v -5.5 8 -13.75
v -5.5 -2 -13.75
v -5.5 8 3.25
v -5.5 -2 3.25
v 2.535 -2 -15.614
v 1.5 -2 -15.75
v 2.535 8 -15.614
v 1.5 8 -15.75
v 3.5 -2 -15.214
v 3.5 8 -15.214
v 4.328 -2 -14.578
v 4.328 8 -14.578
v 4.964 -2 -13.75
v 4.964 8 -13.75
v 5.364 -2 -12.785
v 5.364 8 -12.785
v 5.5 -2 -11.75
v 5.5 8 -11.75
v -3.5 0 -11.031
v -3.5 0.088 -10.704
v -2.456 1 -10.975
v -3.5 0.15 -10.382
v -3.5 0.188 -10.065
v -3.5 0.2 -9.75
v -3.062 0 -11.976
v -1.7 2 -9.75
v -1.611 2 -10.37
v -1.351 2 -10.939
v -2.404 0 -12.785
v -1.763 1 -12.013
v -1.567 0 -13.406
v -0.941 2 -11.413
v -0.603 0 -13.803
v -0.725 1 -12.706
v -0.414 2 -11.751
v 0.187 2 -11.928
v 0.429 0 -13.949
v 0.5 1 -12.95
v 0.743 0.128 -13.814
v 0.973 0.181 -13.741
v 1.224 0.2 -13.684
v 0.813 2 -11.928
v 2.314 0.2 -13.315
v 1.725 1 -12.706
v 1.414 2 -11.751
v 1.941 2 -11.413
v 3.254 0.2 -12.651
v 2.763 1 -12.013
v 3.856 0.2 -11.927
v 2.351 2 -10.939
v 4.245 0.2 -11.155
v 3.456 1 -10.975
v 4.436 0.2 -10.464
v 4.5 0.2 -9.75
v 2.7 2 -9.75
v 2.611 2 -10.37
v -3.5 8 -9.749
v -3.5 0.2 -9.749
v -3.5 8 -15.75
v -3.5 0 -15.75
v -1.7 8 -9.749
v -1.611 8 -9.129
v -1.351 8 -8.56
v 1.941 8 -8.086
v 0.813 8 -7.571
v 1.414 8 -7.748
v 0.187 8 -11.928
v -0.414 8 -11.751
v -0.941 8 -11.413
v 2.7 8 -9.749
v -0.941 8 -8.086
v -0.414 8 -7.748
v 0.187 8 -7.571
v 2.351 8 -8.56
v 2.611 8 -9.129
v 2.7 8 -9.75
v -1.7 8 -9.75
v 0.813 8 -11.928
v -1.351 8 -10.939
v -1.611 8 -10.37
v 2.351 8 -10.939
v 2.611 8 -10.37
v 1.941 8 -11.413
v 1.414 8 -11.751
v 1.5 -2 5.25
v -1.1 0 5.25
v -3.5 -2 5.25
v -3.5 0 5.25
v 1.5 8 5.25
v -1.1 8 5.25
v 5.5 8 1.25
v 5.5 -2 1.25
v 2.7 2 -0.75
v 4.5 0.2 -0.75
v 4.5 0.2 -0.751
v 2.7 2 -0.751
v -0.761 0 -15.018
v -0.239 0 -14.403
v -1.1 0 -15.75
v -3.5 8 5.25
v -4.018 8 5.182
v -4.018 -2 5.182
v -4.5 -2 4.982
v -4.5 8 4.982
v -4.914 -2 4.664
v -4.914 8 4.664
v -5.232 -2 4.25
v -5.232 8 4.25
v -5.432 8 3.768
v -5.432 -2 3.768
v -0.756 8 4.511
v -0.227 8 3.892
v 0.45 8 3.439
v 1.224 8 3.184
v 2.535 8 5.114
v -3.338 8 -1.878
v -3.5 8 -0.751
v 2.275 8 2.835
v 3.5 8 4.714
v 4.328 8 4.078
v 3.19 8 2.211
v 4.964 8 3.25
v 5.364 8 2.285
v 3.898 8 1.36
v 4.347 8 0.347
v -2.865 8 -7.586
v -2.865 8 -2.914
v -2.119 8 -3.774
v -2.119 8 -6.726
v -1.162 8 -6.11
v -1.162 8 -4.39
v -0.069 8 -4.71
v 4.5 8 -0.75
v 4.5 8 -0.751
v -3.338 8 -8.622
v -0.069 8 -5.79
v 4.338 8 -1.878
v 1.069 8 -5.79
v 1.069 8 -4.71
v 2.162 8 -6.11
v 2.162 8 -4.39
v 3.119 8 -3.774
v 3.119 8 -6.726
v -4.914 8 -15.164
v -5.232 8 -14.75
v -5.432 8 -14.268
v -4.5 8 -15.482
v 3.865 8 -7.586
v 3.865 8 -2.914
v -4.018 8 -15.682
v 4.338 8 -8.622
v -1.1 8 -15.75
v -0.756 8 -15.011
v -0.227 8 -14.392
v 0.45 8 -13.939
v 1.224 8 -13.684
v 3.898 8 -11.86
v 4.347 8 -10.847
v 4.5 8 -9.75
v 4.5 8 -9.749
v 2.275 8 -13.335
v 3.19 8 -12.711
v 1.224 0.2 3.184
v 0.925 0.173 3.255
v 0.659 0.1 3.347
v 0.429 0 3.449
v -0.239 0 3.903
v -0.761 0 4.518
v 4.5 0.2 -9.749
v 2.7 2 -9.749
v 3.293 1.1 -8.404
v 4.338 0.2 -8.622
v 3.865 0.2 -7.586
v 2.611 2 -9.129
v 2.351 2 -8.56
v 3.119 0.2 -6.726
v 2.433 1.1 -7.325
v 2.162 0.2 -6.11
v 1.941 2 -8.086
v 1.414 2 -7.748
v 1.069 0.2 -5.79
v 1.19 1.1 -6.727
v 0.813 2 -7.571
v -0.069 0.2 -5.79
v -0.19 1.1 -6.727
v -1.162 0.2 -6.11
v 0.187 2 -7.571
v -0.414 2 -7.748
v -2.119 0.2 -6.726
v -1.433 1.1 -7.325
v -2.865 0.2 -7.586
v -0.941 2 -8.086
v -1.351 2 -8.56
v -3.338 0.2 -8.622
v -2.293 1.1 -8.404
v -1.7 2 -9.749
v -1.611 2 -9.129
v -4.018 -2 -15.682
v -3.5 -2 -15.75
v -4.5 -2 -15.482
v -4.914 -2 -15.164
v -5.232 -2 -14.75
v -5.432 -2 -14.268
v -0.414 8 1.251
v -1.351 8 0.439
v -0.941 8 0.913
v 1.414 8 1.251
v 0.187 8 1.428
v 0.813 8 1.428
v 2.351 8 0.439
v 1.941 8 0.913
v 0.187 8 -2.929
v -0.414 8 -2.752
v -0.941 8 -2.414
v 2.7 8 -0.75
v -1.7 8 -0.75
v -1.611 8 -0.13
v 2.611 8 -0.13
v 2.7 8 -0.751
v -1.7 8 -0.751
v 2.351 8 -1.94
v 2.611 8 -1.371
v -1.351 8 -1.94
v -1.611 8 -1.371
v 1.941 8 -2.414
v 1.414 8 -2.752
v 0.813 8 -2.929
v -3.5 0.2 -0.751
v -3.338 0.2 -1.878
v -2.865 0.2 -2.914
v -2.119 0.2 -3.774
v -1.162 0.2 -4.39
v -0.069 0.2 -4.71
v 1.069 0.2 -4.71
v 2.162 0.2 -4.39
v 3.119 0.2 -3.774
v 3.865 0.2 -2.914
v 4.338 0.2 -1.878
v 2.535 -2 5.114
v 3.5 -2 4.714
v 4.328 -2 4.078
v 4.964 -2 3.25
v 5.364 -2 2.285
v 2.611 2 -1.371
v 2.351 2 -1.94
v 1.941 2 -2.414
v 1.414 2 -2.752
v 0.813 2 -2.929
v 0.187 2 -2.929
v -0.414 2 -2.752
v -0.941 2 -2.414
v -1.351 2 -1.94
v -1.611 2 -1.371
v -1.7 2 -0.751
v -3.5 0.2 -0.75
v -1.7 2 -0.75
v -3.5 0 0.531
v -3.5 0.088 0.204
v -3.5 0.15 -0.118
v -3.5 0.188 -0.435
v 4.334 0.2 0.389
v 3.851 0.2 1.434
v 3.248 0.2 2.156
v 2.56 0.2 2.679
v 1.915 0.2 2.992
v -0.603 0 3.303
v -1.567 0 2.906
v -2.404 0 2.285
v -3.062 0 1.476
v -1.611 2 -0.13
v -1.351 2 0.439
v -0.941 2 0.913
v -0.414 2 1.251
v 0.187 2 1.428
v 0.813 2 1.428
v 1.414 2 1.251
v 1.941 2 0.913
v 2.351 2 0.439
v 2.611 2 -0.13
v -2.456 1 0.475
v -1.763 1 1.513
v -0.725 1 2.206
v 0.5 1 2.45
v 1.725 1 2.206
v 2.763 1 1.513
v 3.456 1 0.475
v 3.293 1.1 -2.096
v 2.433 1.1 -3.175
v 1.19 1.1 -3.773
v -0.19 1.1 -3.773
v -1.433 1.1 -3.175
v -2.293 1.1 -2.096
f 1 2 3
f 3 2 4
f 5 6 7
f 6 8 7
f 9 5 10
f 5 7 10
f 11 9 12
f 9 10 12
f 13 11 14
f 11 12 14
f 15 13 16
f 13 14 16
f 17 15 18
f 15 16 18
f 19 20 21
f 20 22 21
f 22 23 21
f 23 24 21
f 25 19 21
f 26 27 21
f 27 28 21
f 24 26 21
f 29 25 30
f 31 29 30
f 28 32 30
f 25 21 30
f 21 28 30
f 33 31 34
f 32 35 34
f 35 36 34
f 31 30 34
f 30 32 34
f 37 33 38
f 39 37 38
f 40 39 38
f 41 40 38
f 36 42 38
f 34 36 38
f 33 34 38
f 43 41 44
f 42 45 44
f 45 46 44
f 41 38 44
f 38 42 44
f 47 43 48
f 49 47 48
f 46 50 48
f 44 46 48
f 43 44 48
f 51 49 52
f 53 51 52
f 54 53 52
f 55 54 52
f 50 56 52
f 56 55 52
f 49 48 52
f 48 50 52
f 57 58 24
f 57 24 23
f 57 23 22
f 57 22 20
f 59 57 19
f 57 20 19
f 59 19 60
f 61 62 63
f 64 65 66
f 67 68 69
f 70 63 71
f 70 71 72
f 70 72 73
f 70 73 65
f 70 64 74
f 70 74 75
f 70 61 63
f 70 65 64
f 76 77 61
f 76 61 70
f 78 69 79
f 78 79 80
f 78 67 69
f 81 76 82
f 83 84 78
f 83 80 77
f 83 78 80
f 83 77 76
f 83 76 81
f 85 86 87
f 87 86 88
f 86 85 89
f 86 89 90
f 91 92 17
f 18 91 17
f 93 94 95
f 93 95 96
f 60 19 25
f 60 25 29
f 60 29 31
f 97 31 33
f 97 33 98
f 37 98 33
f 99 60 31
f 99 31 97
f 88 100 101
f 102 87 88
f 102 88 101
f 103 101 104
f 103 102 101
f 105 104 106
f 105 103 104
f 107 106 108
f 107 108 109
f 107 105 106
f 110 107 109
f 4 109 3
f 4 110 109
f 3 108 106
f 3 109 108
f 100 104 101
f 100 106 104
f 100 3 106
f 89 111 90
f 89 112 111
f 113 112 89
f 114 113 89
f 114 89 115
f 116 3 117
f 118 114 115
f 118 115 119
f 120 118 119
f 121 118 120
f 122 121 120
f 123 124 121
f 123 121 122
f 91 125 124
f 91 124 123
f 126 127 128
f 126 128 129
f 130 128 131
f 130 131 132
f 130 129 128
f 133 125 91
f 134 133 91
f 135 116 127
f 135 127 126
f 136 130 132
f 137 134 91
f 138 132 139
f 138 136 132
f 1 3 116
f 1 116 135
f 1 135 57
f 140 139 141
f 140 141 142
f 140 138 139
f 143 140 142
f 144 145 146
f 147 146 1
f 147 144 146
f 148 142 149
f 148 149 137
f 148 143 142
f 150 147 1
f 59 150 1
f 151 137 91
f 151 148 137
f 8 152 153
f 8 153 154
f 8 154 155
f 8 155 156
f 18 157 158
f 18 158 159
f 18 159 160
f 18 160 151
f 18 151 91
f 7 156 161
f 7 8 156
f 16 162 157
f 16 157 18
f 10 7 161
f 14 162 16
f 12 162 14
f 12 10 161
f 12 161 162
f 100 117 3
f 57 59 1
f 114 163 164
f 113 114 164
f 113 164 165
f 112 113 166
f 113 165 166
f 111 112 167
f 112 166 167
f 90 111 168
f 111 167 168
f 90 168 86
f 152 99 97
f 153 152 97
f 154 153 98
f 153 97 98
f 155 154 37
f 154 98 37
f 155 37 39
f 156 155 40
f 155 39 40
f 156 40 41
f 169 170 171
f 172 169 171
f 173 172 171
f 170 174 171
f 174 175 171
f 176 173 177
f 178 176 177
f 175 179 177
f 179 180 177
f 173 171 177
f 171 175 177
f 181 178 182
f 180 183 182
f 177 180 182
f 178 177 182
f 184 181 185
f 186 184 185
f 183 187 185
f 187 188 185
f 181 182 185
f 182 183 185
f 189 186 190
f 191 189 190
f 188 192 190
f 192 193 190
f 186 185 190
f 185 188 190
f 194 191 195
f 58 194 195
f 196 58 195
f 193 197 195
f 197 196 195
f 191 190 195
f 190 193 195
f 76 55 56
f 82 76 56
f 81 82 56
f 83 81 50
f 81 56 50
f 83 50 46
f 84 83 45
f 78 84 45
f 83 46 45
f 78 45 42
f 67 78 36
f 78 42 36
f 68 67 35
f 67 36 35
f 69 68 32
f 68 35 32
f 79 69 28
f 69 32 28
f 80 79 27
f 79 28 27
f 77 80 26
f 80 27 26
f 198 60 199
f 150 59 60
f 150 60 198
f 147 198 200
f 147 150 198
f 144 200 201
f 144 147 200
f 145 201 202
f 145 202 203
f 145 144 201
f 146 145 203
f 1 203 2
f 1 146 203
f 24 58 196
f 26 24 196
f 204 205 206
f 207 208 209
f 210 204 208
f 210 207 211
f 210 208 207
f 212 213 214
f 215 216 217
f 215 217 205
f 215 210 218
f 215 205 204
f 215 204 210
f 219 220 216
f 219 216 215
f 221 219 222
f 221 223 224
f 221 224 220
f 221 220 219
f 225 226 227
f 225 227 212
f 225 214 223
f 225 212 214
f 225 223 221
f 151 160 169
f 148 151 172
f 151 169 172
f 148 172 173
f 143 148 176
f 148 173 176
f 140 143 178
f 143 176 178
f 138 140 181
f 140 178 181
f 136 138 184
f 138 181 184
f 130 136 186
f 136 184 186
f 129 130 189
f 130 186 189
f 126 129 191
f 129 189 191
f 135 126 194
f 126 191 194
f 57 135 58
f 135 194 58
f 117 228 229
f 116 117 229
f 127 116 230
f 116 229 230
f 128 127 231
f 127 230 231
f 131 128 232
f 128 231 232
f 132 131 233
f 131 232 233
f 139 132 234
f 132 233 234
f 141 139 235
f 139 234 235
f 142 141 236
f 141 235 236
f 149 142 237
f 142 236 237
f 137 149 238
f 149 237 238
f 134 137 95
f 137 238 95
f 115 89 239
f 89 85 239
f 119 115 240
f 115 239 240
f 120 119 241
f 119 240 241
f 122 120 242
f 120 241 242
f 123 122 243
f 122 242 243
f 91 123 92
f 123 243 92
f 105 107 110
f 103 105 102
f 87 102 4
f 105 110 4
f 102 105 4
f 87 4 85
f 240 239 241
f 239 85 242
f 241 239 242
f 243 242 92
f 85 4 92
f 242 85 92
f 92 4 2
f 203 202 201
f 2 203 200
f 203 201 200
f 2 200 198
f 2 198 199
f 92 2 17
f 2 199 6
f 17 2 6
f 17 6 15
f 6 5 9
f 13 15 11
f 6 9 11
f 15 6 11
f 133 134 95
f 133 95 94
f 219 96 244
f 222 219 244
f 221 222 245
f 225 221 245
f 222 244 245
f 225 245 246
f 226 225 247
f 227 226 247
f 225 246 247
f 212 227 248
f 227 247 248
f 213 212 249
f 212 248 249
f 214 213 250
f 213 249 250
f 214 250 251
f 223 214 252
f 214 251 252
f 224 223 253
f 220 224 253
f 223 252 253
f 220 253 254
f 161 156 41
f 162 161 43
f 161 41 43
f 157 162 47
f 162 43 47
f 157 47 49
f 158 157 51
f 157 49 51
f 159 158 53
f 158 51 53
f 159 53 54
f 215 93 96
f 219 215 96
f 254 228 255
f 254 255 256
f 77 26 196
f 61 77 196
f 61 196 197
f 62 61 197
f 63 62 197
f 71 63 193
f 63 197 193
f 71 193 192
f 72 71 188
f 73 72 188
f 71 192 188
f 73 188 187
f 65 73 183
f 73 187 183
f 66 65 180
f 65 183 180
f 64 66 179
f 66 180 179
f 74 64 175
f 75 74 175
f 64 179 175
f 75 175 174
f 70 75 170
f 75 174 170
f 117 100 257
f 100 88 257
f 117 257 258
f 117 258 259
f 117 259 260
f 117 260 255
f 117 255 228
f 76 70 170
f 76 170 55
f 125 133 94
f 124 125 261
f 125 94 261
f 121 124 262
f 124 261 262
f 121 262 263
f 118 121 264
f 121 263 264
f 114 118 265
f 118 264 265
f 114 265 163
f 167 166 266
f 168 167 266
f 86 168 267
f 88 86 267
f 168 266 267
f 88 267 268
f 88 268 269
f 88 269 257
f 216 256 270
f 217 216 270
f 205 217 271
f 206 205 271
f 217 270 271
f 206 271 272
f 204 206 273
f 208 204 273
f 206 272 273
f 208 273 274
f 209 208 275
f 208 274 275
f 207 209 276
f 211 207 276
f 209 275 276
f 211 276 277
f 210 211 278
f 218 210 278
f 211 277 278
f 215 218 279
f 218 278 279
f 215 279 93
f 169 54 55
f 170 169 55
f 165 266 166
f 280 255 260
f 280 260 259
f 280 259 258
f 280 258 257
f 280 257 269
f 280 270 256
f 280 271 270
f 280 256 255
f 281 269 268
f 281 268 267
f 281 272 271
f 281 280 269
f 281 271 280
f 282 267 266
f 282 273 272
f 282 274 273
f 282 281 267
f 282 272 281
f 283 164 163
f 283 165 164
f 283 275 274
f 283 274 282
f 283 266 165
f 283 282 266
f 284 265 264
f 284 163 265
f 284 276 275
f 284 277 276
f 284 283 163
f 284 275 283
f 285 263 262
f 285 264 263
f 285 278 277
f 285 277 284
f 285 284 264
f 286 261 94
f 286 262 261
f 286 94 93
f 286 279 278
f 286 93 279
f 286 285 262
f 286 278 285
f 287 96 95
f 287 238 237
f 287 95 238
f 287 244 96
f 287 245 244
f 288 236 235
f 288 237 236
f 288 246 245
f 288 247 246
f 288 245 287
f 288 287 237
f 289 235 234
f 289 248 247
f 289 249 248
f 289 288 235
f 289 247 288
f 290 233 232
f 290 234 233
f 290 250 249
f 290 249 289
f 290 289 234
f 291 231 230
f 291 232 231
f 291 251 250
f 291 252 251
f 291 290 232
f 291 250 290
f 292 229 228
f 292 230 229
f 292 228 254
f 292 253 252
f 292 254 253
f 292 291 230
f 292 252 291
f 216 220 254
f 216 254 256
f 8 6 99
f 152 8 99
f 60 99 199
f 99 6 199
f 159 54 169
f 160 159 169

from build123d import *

# Parameters (mm, degrees)
BOSS_EXTRUDE3_DEPTH   = 8
BOSS_EXTRUDE3_2_DEPTH = 8
SKETCH4_W             = 11
SKETCH4_H             = 10.5
BOSS_EXTRUDE4_DEPTH   = 2
FILLET3_R             = 3
MIRROR2_START         = -2
MIRROR2_DEPTH         = 10
MIRROR2_2_DEPTH       = 2
CHAMFER1_SIZE         = 2
FILLET4_R             = 4
FILLET5_R             = 2


# Read off the part's stored shape, not the designer's step: Mirror2
with BuildPart() as part:
    # Sketch3 → Boss-Extrude3 (new body)
    with BuildSketch(Plane(origin=(0, 0, 0), x_dir=(1, 0, 0), z_dir=(0, 1, 0))):
        with BuildLine():
            Line((-1.1, -5.25), (5.5, -5.25))
            Line((5.5, -5.25), (5.5, 5.25))
            Line((5.5, 5.25), (-5.5, 5.25))
            Line((-5.5, 5.25), (-5.5, -5.25))
            Line((-5.5, -5.25), (-3.5, -5.25))
            Line((-3.5, -5.25), (-3.5, 0.751))
            ThreePointArc((-3.5, 0.751), (0.5, 4.751), (4.5, 0.751))
            Line((4.5, 0.751), (4.5, 0.75))
            ThreePointArc((4.5, 0.75), (2.69089023, -2.596640106), (-1.1, -2.916060556))
            Line((-1.1, -2.916060556), (-1.1, -5.25))
        make_face()
    extrude(amount=BOSS_EXTRUDE3_DEPTH)



with BuildPart() as body_2:
    # Sketch3 → Boss-Extrude3 2 (new body)
    with BuildSketch(Plane(origin=(0, 0, 0), x_dir=(1, 0, 0), z_dir=(0, 1, 0))):
        with BuildLine():
            ThreePointArc((-1.7, 0.75), (0.5, -1.45), (2.7, 0.75))
            Line((2.7, 0.75), (2.7, 0.751))
            ThreePointArc((2.7, 0.751), (0.5, 2.951), (-1.7, 0.751))
            Line((-1.7, 0.751), (-1.7, 0.75))
        make_face()
    extrude(amount=BOSS_EXTRUDE3_2_DEPTH)


with BuildPart() as part_1:
    add(part.part)

    add(body_2.part)  # Boss-Extrude4 merges body 2
    # Sketch4 → Boss-Extrude4 (add)
    with BuildSketch(Plane(origin=(0, 0, 0), x_dir=(-1, 0, 0), z_dir=(0, -1, 0))):
        Rectangle(SKETCH4_W, SKETCH4_H)
    extrude(amount=BOSS_EXTRUDE4_DEPTH)

    # Fillet3
    # the kernel refuses this fillet: 3 mm, written as the material it takes off along each edge
    with BuildSketch(Plane(origin=(-1.1, 0, 2.916060556), x_dir=(1.3123233716119625e-12, 0, 1.0), z_dir=(0, 1, 0))) as fillet3_piece_1:
        with BuildLine():
            CenterArc((3.21838304, 2.866663483), FILLET3_R, 190.425211714, 62.42837206)
            ThreePointArc((0.267907213, 2.323807705), (0.307618872, 1.141882326), (0, 0))
            Line((0, 0), (2.333939444, 0))
        make_face()
    extrude(amount=13.847999938, mode=Mode.SUBTRACT)

    # Mirror2 outline → Mirror2 (add)
    with BuildSketch(Plane(origin=(0, 0, 0), x_dir=(1, 0, 0), z_dir=(0, 1, 0)).offset(MIRROR2_START)):
        with BuildLine():
            ThreePointArc((1.223807705, 13.683967769), (3.573697352, 12.309762604), (4.5, 9.75))
            Line((4.5, 9.75), (4.5, 9.749))
            ThreePointArc((4.5, 9.749), (0.5, 5.749), (-3.5, 9.749))
            Line((-3.5, 9.749), (-3.5, 15.75))
            Line((-3.5, 15.75), (-5.5, 15.75))
            Line((-5.5, 15.75), (-5.5, 5.25))
            Line((-5.5, 5.25), (5.5, 5.25))
            Line((5.5, 5.25), (5.5, 15.75))
            Line((5.5, 15.75), (-1.1, 15.75))
            ThreePointArc((-1.1, 15.75), (-0.226657287, 14.392419442), (1.223807705, 13.683967769))
        make_face()
        with BuildLine():
            ThreePointArc((-1.7, 9.749), (0.5, 7.549), (2.7, 9.749))
            Line((2.7, 9.749), (2.7, 9.75))
            ThreePointArc((2.7, 9.75), (0.5, 11.95), (-1.7, 9.75))
            Line((-1.7, 9.75), (-1.7, 9.749))
        make_face()
    extrude(amount=MIRROR2_DEPTH)

    # Mirror2 2 outline → Mirror2 2 (add)
    with BuildSketch(Plane(origin=(0, 0, 0), x_dir=(1, 0, 0), z_dir=(0, 1, 0)).offset(MIRROR2_START)):
        with BuildLine():
            Line((4.5, 9.749), (4.5, 9.75))
            ThreePointArc((4.5, 9.75), (3.573697352, 12.309762604), (1.223807705, 13.683967769))
            ThreePointArc((1.223807705, 13.683967769), (-0.226657287, 14.392419442), (-1.1, 15.75))
            Line((-1.1, 15.75), (-3.5, 15.75))
            Line((-3.5, 15.75), (-3.5, 9.749))
            ThreePointArc((-3.5, 9.749), (0.5, 5.749), (4.5, 9.749))
        make_face()
        with BuildLine():
            Line((2.7, 9.75), (2.7, 9.749))
            ThreePointArc((2.7, 9.749), (0.5, 7.549), (-1.7, 9.749))
            Line((-1.7, 9.749), (-1.7, 9.75))
            ThreePointArc((-1.7, 9.75), (0.5, 11.95), (2.7, 9.75))
        make_face(mode=Mode.SUBTRACT)
    extrude(amount=MIRROR2_2_DEPTH)

    # Chamfer1
    # the kernel refuses this chamfer: 2 mm, written as the material it adds along each edge
    with BuildSketch(Plane(origin=(0.5, 0, -9.749), x_dir=(1, 0, 0), z_dir=(0, 0, -1))) as chamfer1_piece_1:
        Polygon((2.2 + CHAMFER1_SIZE, 0), (2.2, -CHAMFER1_SIZE), (2.2, 0), align=None)
    revolve(axis=Axis((0.5, 0, -9.749), (0, -1, 0)), revolution_arc=180)
    with BuildSketch(Plane(origin=(-1.7, 0, -9.749), x_dir=(-0.9996219169112968, -0.027495876610586365, 0), z_dir=(0, 0, -1)), Plane(origin=(2.7, 0, -9.75), x_dir=(0.9996219169112968, -0.027495876610586365, 0), z_dir=(0, 0, 1))) as chamfer1_piece_2:
        Polygon((CHAMFER1_SIZE * 0.999621916911, CHAMFER1_SIZE * 0.0274958766106), (-CHAMFER1_SIZE * 0.0274958766106, CHAMFER1_SIZE * 0.999621916911), (0, 0), align=None)
    extrude(amount=0.001)
    with BuildSketch(Plane(origin=(0.5, 0, -9.75), x_dir=(-1, 0, 0), z_dir=(0, 0, 1))) as chamfer1_piece_3:
        Polygon((2.2 + CHAMFER1_SIZE, 0), (2.2, -CHAMFER1_SIZE), (2.2, 0), align=None)
    revolve(axis=Axis((0.5, 0, -9.75), (0, -1, 0)), revolution_arc=180)
    with BuildSketch(Plane(origin=(0.5, 0, -0.751), x_dir=(1, 0, 0), z_dir=(0, 0, 1))) as chamfer1_piece_4:
        Polygon((2.2 + CHAMFER1_SIZE, 0), (2.2, CHAMFER1_SIZE), (2.2, 0), align=None)
    revolve(axis=Axis((0.5, 0, -0.751), (0, 1, 0)), revolution_arc=180)
    with BuildSketch(Plane(origin=(-1.7, 0, -0.751), x_dir=(-0.9996219169112968, -0.027495876610586372, 0), z_dir=(0, 0, 1)), Plane(origin=(2.7, 0, -0.75), x_dir=(0.9996219169112968, -0.027495876610586358, 0), z_dir=(0, 0, -1))) as chamfer1_piece_5:
        Polygon((CHAMFER1_SIZE * 0.999621916911, -CHAMFER1_SIZE * 0.0274958766106), (-CHAMFER1_SIZE * 0.0274958766106, -CHAMFER1_SIZE * 0.999621916911), (0, 0), align=None)
    extrude(amount=0.001)
    with BuildSketch(Plane(origin=(0.5, 0, -0.75), x_dir=(-1, 0, 0), z_dir=(0, 0, -1))) as chamfer1_piece_6:
        Polygon((2.2 + CHAMFER1_SIZE, 0), (2.2, CHAMFER1_SIZE), (2.2, 0), align=None)
    revolve(axis=Axis((0.5, 0, -0.75), (0, 1, 0)), revolution_arc=180)

    # Fillet4
    fillet4_edges = [part_1.edges().sort_by_distance(p)[0] for p in [
        (5.5, 3, 5.25),
        (5.5, 3, -15.75),
    ]]
    fillet(fillet4_edges, radius=FILLET4_R)

    # Fillet5
    fillet5_edges = [part_1.edges().sort_by_distance(p)[0] for p in [
        (-5.5, 3, -15.75),
        (-5.5, 3, 5.25),
    ]]
    fillet(fillet5_edges, radius=FILLET5_R)


solid = part_1.part
